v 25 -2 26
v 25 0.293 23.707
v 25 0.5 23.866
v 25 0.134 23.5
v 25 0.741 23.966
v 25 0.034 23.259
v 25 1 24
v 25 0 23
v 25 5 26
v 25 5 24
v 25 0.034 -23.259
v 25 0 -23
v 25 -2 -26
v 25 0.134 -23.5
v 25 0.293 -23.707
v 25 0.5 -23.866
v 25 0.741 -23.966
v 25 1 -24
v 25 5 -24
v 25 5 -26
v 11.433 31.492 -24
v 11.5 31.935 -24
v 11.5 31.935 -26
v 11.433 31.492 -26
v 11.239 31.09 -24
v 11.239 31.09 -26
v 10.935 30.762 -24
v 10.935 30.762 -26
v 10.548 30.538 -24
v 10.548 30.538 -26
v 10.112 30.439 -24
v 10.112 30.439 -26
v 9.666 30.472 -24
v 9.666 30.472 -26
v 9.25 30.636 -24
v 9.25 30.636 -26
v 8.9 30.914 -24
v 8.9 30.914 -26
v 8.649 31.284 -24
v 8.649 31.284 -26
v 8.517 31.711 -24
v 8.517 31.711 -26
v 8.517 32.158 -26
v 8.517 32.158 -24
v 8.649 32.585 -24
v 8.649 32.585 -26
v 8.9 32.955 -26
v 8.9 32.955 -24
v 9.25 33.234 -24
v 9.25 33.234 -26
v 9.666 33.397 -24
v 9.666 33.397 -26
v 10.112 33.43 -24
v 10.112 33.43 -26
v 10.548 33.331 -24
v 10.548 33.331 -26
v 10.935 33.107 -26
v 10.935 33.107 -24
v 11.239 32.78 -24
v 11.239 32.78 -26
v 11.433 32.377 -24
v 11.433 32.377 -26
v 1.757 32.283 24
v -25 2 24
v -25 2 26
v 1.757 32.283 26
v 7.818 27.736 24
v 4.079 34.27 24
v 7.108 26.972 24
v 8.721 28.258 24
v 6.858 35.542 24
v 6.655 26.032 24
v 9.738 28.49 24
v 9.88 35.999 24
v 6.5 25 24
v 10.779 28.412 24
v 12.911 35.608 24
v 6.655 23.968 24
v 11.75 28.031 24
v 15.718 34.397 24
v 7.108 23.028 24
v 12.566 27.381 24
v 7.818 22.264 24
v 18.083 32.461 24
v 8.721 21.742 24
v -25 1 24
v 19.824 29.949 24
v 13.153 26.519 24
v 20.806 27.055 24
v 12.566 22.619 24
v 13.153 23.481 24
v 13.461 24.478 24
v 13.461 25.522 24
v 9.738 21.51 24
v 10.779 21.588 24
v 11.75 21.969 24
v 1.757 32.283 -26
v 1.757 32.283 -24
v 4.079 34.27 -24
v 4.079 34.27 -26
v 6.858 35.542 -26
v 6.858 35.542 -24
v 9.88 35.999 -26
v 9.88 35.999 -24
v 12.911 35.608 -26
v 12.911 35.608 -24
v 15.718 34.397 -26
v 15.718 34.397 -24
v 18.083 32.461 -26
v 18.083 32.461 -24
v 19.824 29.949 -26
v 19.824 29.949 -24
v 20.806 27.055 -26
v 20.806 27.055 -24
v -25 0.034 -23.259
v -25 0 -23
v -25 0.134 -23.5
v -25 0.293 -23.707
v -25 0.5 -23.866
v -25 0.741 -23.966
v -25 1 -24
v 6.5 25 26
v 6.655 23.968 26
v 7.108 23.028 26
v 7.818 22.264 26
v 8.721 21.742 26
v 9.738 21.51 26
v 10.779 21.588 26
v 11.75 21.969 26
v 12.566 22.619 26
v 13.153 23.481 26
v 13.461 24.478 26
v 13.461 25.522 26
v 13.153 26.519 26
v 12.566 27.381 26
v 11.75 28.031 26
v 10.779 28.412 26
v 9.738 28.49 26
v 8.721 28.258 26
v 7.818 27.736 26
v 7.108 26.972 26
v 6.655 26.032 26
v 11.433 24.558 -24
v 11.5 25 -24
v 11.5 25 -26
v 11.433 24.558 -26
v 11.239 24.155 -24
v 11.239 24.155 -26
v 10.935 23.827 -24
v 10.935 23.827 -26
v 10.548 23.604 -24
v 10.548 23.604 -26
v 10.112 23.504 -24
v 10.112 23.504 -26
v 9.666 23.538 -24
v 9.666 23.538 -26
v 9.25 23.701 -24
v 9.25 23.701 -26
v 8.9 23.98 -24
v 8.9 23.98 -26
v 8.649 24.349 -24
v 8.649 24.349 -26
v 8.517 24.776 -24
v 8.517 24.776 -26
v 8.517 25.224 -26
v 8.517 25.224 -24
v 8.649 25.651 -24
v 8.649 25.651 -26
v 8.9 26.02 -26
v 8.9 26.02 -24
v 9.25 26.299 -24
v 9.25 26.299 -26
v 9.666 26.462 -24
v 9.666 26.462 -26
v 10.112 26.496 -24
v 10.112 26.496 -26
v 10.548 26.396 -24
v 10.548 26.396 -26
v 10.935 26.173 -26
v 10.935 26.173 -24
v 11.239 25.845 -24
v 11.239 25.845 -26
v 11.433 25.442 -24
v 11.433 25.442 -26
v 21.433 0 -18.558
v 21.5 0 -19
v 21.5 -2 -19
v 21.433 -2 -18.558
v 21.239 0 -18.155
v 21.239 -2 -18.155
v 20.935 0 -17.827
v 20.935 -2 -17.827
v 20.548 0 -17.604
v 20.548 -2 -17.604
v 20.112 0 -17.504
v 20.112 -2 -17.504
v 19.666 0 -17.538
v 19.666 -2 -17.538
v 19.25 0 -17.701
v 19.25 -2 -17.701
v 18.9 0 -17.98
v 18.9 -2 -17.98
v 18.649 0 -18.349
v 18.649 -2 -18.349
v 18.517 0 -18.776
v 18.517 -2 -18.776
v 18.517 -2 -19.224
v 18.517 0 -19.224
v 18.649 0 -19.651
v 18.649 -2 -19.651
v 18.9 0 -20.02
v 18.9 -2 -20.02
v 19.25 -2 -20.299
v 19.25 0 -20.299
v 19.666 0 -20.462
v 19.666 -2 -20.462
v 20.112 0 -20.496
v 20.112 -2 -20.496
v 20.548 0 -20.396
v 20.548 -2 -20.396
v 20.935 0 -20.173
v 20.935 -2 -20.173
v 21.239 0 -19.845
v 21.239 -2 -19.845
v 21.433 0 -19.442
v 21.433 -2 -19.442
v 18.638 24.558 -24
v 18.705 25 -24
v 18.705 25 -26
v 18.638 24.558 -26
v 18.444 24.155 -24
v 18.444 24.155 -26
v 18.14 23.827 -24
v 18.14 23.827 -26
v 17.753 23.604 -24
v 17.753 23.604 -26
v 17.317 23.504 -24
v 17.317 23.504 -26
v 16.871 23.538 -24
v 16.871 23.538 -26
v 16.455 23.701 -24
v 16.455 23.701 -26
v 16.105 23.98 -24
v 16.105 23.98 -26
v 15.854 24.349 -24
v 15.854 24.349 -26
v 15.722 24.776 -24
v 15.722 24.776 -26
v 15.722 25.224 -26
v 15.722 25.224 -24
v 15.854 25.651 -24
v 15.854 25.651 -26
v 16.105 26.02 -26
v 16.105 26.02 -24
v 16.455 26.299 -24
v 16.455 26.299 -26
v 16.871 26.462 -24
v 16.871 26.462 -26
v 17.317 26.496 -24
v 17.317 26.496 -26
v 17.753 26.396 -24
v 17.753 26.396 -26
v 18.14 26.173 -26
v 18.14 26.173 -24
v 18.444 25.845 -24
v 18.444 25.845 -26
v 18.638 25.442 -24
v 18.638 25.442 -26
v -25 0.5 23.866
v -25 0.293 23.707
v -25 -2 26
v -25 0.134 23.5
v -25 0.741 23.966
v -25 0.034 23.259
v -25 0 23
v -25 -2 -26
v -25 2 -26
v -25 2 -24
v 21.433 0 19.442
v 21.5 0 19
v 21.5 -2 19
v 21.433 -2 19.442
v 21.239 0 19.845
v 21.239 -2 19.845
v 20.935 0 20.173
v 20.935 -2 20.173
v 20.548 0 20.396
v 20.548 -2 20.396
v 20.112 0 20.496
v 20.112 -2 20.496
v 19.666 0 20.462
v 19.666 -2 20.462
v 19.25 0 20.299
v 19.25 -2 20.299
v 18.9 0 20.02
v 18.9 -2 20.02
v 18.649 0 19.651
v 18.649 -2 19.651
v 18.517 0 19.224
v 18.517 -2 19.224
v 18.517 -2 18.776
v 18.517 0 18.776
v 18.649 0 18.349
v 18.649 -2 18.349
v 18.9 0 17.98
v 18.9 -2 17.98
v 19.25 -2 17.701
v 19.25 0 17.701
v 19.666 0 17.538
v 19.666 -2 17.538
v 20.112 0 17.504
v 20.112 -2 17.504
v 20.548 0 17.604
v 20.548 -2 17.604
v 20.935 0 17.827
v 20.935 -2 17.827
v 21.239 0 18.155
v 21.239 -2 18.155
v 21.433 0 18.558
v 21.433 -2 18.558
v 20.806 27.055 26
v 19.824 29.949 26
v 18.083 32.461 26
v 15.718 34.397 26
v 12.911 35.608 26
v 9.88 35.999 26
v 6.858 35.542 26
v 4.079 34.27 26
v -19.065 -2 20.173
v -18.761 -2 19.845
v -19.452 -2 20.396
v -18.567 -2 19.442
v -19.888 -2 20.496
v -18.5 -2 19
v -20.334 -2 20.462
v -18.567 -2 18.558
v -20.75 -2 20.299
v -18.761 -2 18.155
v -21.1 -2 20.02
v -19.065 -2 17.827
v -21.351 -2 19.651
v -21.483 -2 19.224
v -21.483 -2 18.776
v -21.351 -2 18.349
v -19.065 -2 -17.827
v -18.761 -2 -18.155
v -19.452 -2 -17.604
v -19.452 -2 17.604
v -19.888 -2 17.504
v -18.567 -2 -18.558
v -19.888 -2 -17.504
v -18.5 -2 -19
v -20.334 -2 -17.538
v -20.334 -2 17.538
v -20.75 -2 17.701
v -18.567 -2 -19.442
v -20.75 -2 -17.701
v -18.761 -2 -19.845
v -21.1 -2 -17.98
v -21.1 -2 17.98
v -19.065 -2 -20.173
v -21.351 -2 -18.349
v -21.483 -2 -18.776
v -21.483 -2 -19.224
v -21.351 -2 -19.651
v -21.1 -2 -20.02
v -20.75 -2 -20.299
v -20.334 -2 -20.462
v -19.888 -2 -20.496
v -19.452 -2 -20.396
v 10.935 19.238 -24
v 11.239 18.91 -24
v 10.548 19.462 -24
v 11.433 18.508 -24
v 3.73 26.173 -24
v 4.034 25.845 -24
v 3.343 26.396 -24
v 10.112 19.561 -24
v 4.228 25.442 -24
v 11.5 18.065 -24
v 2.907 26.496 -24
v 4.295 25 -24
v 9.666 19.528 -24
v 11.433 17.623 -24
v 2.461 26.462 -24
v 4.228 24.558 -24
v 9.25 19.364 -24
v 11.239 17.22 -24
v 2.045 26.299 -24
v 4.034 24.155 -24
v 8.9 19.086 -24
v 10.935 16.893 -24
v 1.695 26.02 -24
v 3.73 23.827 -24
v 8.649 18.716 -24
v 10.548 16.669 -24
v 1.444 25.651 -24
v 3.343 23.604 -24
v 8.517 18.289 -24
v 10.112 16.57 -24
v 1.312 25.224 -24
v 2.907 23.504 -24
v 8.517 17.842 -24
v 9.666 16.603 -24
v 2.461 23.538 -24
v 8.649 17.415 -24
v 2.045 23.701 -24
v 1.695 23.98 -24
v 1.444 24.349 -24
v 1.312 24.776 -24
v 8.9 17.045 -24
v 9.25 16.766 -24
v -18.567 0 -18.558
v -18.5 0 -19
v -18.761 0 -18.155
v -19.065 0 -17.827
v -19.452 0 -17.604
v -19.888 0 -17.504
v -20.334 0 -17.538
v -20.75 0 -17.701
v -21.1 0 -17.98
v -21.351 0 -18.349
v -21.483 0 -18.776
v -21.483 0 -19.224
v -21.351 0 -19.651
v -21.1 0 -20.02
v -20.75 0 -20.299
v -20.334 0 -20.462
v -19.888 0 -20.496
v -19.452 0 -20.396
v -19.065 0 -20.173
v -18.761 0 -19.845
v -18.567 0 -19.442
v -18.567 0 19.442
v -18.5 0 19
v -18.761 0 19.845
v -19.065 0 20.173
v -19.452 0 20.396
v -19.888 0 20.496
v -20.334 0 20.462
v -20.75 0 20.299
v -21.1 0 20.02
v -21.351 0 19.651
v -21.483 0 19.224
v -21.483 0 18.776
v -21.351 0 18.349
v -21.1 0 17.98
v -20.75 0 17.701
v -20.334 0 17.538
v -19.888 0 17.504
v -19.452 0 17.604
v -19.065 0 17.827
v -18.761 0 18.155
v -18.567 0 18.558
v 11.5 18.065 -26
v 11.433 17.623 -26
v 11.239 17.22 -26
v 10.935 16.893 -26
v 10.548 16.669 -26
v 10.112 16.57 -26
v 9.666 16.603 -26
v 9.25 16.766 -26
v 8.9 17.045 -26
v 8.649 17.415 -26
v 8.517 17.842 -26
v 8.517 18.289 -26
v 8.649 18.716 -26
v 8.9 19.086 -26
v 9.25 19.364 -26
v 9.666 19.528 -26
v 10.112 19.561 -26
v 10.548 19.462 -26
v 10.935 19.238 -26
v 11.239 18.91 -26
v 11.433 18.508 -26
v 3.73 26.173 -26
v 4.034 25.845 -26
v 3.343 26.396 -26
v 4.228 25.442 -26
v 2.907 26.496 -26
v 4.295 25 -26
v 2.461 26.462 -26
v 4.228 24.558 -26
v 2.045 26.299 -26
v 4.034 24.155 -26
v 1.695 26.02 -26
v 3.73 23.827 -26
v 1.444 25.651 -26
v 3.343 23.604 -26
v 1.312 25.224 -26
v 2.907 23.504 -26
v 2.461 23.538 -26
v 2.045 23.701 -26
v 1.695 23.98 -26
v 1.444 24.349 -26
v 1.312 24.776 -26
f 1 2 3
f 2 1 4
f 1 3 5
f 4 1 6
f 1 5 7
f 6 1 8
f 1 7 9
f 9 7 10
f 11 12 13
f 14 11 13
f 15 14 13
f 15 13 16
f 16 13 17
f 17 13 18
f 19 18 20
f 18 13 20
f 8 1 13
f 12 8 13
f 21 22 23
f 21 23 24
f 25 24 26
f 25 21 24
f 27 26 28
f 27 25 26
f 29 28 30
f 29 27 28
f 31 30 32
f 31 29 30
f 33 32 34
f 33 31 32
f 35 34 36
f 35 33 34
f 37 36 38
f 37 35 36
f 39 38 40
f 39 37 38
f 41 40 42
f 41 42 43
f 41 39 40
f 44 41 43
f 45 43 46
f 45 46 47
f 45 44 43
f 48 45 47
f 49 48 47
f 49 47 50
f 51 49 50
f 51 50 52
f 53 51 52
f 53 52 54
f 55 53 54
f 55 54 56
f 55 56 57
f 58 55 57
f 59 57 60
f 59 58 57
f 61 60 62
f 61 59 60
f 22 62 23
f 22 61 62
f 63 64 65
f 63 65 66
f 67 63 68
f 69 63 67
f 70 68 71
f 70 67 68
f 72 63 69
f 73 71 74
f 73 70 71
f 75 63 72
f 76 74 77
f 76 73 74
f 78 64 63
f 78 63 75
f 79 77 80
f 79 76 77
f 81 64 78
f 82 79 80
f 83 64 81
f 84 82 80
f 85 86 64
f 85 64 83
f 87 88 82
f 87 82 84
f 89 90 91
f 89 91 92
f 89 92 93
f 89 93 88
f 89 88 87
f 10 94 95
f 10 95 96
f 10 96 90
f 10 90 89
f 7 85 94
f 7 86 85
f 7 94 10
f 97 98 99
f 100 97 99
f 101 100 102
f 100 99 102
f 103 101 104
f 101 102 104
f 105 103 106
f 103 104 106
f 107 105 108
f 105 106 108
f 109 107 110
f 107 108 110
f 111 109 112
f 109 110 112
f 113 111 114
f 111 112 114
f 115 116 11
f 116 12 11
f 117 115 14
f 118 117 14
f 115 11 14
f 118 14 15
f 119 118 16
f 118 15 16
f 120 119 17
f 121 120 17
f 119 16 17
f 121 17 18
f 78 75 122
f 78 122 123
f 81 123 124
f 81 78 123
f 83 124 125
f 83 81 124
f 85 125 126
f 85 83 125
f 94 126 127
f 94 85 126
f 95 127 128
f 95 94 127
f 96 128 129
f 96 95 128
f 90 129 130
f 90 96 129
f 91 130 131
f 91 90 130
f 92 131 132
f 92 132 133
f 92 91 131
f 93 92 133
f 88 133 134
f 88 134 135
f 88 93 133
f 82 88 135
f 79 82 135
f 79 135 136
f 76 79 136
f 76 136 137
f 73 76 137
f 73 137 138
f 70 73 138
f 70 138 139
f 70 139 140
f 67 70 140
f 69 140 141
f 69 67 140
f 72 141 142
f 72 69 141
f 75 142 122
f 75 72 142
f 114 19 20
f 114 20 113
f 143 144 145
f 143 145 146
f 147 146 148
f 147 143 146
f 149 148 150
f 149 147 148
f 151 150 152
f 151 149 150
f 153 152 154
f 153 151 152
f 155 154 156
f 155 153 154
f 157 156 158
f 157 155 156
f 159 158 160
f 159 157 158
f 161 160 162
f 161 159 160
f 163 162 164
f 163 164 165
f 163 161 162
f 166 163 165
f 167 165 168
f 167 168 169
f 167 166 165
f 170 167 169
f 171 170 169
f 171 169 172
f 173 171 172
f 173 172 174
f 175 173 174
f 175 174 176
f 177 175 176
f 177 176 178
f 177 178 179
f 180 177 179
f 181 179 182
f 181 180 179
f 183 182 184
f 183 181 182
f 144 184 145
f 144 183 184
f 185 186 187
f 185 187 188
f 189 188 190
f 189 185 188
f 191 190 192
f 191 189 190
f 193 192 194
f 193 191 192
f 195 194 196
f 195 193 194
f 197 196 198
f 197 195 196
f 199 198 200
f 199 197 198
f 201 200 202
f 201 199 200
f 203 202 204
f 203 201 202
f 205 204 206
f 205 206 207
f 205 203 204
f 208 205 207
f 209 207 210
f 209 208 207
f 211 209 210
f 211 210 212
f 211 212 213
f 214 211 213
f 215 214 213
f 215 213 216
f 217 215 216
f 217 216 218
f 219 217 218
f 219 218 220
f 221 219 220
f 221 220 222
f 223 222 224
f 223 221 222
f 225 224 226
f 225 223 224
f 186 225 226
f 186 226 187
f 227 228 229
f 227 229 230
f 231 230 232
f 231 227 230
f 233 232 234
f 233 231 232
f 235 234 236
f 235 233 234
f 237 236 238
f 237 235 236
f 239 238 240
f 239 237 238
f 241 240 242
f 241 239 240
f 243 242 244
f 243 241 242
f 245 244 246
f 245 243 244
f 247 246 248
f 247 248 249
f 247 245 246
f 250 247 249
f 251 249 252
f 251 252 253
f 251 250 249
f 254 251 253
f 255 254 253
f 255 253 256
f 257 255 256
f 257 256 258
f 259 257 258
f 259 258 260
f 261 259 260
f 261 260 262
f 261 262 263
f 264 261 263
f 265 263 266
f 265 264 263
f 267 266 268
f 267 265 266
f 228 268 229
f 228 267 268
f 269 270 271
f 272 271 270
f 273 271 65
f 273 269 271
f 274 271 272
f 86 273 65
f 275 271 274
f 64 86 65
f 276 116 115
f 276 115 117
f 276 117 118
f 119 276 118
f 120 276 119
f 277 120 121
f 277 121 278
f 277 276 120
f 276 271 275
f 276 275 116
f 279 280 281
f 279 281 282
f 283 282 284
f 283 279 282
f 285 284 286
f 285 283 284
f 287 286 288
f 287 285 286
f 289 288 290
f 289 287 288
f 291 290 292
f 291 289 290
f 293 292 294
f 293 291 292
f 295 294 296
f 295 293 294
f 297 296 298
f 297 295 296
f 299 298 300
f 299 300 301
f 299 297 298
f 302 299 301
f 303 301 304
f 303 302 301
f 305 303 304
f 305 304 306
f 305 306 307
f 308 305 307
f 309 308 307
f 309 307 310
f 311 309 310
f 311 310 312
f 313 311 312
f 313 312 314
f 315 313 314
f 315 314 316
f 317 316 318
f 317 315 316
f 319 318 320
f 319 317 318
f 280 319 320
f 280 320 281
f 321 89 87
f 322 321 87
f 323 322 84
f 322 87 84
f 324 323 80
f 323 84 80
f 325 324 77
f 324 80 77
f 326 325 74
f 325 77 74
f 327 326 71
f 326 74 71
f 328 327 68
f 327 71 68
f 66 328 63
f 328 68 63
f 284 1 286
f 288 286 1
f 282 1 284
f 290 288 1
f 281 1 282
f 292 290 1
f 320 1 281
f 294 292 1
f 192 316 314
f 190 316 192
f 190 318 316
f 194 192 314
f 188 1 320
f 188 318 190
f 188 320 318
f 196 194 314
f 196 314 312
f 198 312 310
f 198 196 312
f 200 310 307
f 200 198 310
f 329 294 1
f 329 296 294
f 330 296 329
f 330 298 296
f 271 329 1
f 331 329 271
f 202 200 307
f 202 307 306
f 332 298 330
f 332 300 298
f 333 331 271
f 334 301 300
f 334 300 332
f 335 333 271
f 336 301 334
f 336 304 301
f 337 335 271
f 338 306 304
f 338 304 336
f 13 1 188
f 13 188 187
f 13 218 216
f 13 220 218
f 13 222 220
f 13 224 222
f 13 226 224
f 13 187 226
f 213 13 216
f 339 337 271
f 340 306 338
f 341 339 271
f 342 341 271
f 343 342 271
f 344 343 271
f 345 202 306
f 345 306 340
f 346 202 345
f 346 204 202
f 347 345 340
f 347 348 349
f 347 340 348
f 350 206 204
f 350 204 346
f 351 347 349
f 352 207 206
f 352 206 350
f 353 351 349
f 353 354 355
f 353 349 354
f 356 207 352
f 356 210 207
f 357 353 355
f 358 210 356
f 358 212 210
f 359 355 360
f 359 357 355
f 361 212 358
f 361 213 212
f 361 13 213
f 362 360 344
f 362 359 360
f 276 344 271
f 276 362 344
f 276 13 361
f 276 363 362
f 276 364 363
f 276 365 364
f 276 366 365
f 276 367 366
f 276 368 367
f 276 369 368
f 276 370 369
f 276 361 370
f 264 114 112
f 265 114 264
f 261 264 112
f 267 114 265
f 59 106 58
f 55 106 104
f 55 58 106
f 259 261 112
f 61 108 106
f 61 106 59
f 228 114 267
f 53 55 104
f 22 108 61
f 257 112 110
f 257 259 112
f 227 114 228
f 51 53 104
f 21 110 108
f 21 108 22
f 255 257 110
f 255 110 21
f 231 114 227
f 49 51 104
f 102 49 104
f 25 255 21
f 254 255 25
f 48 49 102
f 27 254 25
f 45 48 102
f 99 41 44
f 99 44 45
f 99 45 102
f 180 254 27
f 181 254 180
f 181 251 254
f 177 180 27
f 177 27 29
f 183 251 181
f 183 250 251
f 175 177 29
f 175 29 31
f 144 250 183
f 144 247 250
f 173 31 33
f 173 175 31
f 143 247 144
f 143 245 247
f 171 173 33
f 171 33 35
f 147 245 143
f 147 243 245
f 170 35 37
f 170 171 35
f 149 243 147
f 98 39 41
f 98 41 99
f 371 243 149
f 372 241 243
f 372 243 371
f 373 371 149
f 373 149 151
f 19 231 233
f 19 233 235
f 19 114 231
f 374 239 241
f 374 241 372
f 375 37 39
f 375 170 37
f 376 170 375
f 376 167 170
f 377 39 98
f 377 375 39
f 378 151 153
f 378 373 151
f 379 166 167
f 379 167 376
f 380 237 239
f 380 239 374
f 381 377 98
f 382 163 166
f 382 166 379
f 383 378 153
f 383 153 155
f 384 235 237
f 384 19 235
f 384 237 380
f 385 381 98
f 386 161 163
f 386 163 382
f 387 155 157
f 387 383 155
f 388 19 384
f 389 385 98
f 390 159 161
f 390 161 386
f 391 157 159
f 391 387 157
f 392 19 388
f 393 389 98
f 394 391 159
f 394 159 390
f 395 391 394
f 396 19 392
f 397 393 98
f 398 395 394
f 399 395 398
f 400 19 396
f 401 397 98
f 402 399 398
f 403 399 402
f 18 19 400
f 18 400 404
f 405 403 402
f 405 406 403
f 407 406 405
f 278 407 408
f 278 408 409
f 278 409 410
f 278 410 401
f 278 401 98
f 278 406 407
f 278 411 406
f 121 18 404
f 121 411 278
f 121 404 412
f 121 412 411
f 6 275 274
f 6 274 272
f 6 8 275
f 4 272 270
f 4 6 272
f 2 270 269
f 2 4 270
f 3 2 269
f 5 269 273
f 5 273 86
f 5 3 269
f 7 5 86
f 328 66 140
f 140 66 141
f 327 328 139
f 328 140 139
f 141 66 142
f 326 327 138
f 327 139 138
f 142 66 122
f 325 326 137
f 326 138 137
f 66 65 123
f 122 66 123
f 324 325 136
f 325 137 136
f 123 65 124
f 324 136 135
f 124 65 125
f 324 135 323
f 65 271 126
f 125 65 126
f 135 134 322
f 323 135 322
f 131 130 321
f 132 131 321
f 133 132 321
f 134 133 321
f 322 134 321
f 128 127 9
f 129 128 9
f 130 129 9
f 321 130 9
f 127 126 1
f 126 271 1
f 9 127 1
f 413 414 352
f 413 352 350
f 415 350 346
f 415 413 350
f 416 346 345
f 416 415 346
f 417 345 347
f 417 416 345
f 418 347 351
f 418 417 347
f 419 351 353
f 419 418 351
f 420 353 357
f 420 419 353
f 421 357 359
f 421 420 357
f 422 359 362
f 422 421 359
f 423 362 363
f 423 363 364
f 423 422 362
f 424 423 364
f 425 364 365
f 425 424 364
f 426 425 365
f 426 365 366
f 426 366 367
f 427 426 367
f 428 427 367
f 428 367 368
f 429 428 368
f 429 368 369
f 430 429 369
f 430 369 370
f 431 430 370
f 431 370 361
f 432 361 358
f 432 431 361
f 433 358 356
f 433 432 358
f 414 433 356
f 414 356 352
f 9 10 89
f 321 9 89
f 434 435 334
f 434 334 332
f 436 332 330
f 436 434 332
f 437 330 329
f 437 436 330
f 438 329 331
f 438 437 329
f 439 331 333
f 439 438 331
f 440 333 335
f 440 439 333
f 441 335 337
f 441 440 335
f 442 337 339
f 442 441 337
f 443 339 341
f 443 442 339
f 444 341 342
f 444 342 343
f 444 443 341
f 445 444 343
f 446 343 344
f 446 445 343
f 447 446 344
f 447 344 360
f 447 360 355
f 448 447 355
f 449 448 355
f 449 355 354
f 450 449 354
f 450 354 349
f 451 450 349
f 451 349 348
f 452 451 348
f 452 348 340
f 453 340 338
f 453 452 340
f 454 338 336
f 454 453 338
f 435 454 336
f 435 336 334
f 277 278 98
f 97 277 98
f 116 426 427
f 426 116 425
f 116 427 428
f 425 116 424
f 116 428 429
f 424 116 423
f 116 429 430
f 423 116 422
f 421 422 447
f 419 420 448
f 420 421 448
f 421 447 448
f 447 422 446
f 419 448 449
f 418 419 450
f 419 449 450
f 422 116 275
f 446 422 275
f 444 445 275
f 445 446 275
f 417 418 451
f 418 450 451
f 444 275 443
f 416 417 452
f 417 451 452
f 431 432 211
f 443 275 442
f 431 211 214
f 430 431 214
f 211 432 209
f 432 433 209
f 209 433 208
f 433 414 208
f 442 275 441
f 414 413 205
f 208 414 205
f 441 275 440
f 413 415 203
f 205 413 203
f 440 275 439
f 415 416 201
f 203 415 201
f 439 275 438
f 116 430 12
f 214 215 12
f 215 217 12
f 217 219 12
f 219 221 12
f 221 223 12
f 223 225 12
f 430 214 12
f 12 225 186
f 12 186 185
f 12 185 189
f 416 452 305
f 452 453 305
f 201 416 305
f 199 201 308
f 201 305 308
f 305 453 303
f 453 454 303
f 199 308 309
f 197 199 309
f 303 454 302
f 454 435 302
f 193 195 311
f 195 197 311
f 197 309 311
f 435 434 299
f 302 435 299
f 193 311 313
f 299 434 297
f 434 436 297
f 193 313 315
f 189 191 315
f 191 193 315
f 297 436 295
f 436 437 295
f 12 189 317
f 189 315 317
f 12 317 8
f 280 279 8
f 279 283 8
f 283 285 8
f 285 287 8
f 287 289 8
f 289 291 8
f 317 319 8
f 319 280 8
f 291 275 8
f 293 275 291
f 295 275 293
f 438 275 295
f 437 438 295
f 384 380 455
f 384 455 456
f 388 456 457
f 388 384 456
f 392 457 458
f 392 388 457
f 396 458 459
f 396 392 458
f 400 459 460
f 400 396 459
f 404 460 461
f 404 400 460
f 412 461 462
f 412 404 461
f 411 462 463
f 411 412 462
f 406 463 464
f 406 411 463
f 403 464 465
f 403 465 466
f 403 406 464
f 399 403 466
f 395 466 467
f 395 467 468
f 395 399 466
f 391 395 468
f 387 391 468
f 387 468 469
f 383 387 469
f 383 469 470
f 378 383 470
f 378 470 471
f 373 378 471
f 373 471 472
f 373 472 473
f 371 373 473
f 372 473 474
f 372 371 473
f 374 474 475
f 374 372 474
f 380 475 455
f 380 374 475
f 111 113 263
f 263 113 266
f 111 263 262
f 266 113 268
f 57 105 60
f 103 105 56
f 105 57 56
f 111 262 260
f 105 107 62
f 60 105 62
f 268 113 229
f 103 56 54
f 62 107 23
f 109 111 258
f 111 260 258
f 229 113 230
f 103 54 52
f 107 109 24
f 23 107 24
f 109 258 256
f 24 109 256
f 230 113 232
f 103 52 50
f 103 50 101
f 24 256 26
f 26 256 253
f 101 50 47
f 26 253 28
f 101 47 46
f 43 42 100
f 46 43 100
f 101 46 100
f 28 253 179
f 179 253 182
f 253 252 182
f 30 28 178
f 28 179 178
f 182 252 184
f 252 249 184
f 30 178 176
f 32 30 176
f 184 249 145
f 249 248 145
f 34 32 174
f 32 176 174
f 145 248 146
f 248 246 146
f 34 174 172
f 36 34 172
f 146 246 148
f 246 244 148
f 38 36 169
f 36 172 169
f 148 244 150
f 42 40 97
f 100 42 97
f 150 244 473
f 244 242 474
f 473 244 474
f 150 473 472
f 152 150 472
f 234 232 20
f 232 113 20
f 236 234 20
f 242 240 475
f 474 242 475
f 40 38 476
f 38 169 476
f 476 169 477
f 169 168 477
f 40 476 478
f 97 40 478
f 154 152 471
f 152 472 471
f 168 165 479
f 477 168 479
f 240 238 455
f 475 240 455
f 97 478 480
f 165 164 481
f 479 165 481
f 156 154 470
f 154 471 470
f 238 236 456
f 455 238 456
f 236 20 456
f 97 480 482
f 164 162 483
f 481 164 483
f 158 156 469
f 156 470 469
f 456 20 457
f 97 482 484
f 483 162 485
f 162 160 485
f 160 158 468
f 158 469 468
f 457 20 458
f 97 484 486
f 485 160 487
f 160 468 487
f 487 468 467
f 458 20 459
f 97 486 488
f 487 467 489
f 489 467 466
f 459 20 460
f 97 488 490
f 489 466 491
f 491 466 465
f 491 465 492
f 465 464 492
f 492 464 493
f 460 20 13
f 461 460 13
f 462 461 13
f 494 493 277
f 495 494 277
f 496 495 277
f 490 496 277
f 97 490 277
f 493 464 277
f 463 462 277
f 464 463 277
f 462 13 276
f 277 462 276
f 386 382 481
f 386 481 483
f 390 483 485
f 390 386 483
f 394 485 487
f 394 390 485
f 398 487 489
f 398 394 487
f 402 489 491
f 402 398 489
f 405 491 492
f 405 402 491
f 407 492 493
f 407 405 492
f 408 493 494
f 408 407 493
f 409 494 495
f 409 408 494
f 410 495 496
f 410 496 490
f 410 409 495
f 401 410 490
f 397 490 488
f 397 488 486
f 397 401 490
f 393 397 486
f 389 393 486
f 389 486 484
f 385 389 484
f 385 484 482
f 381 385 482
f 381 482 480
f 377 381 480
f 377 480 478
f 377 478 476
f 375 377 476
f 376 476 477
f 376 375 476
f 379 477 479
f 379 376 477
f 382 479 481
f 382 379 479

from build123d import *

# Parameters (mm, degrees)
SKETCH_W     = 50
SKETCH_H     = 48
SKETCH_R     = 1.5
PAD_DEPTH    = 2
SKETCH003_R  = 1.5
PAD001_DEPTH = 2
SKETCH004_R  = 3.5
PAD002_DEPTH = 2
FILLET_R     = 1
FILLET001_R  = 1


with BuildPart() as part:
    # Sketch → Pad (new body)
    with BuildSketch(Plane.XZ):
        Rectangle(SKETCH_W, SKETCH_H)
        with Locations((-20, 19)):
            Circle(SKETCH_R, mode=Mode.SUBTRACT)
        with Locations((20, 19)):
            Circle(SKETCH_R, mode=Mode.SUBTRACT)
        with Locations((-20, -19)):
            Circle(SKETCH_R, mode=Mode.SUBTRACT)
        with Locations((20, -19)):
            Circle(SKETCH_R, mode=Mode.SUBTRACT)
    extrude(amount=PAD_DEPTH)

    # Sketch003 (on Face3 of Pad) → Pad001 (join)
    with BuildSketch(Plane(origin=(0, 0, -24), x_dir=(1, 0, 0), z_dir=(0, 0, -1))):
        with BuildLine():
            Line((-25, 0), (-25, 2))
            Line((-25, 2), (25, 2))
            Line((25, 2), (25, 0))
            Line((25, 0), (25, -5))
            Line((25, -5), (20.80638, -27.054785))
            ThreePointArc((1.756653, -32.283353), (12.911489, -35.607697), (20.80638, -27.054785))
            Line((-25, -2), (1.756653, -32.283353))
            Line((-25, 0), (-25, -2))
        make_face()
        with Locations((10, -31.934549)):
            Circle(SKETCH003_R, mode=Mode.SUBTRACT)
        with Locations((17.205, -25)):
            Circle(SKETCH003_R, mode=Mode.SUBTRACT)
        with Locations((10, -25)):
            Circle(SKETCH003_R, mode=Mode.SUBTRACT)
        with Locations((2.795, -25)):
            Circle(SKETCH003_R, mode=Mode.SUBTRACT)
        with Locations((10, -18.065451)):
            Circle(SKETCH003_R, mode=Mode.SUBTRACT)
    extrude(amount=PAD001_DEPTH)

    # Sketch004 (on Face1 of Pad) → Pad002 (join)
    with BuildSketch(Plane(origin=(0, 0, 24), x_dir=(-1, 0, 0), z_dir=(0, 0, 1))):
        with BuildLine():
            Line((-25, 2), (25, 2))
            Line((25, 2), (25, 0))
            Line((25, 0), (25, -2))
            Line((25, -2), (-1.756653, -32.283353))
            ThreePointArc((-20.80638, -27.054785), (-12.911489, -35.607697), (-1.756653, -32.283353))
            Line((-25, -5), (-20.80638, -27.054785))
            Line((-25, 0), (-25, -5))
            Line((-25, 0), (-25, 2))
        make_face()
        with Locations((-10, -25)):
            Circle(SKETCH004_R, mode=Mode.SUBTRACT)
    extrude(amount=PAD002_DEPTH)

    # Fillet
    fillet_edges = [part.edges().sort_by_distance(p)[0] for p in [
        (0, 0, -24),
    ]]
    fillet(fillet_edges, radius=FILLET_R)

    # Fillet001
    fillet001_edges = [part.edges().sort_by_distance(p)[0] for p in [
        (0, 0, 24),
    ]]
    fillet(fillet001_edges, radius=FILLET001_R)


solid = part.part
